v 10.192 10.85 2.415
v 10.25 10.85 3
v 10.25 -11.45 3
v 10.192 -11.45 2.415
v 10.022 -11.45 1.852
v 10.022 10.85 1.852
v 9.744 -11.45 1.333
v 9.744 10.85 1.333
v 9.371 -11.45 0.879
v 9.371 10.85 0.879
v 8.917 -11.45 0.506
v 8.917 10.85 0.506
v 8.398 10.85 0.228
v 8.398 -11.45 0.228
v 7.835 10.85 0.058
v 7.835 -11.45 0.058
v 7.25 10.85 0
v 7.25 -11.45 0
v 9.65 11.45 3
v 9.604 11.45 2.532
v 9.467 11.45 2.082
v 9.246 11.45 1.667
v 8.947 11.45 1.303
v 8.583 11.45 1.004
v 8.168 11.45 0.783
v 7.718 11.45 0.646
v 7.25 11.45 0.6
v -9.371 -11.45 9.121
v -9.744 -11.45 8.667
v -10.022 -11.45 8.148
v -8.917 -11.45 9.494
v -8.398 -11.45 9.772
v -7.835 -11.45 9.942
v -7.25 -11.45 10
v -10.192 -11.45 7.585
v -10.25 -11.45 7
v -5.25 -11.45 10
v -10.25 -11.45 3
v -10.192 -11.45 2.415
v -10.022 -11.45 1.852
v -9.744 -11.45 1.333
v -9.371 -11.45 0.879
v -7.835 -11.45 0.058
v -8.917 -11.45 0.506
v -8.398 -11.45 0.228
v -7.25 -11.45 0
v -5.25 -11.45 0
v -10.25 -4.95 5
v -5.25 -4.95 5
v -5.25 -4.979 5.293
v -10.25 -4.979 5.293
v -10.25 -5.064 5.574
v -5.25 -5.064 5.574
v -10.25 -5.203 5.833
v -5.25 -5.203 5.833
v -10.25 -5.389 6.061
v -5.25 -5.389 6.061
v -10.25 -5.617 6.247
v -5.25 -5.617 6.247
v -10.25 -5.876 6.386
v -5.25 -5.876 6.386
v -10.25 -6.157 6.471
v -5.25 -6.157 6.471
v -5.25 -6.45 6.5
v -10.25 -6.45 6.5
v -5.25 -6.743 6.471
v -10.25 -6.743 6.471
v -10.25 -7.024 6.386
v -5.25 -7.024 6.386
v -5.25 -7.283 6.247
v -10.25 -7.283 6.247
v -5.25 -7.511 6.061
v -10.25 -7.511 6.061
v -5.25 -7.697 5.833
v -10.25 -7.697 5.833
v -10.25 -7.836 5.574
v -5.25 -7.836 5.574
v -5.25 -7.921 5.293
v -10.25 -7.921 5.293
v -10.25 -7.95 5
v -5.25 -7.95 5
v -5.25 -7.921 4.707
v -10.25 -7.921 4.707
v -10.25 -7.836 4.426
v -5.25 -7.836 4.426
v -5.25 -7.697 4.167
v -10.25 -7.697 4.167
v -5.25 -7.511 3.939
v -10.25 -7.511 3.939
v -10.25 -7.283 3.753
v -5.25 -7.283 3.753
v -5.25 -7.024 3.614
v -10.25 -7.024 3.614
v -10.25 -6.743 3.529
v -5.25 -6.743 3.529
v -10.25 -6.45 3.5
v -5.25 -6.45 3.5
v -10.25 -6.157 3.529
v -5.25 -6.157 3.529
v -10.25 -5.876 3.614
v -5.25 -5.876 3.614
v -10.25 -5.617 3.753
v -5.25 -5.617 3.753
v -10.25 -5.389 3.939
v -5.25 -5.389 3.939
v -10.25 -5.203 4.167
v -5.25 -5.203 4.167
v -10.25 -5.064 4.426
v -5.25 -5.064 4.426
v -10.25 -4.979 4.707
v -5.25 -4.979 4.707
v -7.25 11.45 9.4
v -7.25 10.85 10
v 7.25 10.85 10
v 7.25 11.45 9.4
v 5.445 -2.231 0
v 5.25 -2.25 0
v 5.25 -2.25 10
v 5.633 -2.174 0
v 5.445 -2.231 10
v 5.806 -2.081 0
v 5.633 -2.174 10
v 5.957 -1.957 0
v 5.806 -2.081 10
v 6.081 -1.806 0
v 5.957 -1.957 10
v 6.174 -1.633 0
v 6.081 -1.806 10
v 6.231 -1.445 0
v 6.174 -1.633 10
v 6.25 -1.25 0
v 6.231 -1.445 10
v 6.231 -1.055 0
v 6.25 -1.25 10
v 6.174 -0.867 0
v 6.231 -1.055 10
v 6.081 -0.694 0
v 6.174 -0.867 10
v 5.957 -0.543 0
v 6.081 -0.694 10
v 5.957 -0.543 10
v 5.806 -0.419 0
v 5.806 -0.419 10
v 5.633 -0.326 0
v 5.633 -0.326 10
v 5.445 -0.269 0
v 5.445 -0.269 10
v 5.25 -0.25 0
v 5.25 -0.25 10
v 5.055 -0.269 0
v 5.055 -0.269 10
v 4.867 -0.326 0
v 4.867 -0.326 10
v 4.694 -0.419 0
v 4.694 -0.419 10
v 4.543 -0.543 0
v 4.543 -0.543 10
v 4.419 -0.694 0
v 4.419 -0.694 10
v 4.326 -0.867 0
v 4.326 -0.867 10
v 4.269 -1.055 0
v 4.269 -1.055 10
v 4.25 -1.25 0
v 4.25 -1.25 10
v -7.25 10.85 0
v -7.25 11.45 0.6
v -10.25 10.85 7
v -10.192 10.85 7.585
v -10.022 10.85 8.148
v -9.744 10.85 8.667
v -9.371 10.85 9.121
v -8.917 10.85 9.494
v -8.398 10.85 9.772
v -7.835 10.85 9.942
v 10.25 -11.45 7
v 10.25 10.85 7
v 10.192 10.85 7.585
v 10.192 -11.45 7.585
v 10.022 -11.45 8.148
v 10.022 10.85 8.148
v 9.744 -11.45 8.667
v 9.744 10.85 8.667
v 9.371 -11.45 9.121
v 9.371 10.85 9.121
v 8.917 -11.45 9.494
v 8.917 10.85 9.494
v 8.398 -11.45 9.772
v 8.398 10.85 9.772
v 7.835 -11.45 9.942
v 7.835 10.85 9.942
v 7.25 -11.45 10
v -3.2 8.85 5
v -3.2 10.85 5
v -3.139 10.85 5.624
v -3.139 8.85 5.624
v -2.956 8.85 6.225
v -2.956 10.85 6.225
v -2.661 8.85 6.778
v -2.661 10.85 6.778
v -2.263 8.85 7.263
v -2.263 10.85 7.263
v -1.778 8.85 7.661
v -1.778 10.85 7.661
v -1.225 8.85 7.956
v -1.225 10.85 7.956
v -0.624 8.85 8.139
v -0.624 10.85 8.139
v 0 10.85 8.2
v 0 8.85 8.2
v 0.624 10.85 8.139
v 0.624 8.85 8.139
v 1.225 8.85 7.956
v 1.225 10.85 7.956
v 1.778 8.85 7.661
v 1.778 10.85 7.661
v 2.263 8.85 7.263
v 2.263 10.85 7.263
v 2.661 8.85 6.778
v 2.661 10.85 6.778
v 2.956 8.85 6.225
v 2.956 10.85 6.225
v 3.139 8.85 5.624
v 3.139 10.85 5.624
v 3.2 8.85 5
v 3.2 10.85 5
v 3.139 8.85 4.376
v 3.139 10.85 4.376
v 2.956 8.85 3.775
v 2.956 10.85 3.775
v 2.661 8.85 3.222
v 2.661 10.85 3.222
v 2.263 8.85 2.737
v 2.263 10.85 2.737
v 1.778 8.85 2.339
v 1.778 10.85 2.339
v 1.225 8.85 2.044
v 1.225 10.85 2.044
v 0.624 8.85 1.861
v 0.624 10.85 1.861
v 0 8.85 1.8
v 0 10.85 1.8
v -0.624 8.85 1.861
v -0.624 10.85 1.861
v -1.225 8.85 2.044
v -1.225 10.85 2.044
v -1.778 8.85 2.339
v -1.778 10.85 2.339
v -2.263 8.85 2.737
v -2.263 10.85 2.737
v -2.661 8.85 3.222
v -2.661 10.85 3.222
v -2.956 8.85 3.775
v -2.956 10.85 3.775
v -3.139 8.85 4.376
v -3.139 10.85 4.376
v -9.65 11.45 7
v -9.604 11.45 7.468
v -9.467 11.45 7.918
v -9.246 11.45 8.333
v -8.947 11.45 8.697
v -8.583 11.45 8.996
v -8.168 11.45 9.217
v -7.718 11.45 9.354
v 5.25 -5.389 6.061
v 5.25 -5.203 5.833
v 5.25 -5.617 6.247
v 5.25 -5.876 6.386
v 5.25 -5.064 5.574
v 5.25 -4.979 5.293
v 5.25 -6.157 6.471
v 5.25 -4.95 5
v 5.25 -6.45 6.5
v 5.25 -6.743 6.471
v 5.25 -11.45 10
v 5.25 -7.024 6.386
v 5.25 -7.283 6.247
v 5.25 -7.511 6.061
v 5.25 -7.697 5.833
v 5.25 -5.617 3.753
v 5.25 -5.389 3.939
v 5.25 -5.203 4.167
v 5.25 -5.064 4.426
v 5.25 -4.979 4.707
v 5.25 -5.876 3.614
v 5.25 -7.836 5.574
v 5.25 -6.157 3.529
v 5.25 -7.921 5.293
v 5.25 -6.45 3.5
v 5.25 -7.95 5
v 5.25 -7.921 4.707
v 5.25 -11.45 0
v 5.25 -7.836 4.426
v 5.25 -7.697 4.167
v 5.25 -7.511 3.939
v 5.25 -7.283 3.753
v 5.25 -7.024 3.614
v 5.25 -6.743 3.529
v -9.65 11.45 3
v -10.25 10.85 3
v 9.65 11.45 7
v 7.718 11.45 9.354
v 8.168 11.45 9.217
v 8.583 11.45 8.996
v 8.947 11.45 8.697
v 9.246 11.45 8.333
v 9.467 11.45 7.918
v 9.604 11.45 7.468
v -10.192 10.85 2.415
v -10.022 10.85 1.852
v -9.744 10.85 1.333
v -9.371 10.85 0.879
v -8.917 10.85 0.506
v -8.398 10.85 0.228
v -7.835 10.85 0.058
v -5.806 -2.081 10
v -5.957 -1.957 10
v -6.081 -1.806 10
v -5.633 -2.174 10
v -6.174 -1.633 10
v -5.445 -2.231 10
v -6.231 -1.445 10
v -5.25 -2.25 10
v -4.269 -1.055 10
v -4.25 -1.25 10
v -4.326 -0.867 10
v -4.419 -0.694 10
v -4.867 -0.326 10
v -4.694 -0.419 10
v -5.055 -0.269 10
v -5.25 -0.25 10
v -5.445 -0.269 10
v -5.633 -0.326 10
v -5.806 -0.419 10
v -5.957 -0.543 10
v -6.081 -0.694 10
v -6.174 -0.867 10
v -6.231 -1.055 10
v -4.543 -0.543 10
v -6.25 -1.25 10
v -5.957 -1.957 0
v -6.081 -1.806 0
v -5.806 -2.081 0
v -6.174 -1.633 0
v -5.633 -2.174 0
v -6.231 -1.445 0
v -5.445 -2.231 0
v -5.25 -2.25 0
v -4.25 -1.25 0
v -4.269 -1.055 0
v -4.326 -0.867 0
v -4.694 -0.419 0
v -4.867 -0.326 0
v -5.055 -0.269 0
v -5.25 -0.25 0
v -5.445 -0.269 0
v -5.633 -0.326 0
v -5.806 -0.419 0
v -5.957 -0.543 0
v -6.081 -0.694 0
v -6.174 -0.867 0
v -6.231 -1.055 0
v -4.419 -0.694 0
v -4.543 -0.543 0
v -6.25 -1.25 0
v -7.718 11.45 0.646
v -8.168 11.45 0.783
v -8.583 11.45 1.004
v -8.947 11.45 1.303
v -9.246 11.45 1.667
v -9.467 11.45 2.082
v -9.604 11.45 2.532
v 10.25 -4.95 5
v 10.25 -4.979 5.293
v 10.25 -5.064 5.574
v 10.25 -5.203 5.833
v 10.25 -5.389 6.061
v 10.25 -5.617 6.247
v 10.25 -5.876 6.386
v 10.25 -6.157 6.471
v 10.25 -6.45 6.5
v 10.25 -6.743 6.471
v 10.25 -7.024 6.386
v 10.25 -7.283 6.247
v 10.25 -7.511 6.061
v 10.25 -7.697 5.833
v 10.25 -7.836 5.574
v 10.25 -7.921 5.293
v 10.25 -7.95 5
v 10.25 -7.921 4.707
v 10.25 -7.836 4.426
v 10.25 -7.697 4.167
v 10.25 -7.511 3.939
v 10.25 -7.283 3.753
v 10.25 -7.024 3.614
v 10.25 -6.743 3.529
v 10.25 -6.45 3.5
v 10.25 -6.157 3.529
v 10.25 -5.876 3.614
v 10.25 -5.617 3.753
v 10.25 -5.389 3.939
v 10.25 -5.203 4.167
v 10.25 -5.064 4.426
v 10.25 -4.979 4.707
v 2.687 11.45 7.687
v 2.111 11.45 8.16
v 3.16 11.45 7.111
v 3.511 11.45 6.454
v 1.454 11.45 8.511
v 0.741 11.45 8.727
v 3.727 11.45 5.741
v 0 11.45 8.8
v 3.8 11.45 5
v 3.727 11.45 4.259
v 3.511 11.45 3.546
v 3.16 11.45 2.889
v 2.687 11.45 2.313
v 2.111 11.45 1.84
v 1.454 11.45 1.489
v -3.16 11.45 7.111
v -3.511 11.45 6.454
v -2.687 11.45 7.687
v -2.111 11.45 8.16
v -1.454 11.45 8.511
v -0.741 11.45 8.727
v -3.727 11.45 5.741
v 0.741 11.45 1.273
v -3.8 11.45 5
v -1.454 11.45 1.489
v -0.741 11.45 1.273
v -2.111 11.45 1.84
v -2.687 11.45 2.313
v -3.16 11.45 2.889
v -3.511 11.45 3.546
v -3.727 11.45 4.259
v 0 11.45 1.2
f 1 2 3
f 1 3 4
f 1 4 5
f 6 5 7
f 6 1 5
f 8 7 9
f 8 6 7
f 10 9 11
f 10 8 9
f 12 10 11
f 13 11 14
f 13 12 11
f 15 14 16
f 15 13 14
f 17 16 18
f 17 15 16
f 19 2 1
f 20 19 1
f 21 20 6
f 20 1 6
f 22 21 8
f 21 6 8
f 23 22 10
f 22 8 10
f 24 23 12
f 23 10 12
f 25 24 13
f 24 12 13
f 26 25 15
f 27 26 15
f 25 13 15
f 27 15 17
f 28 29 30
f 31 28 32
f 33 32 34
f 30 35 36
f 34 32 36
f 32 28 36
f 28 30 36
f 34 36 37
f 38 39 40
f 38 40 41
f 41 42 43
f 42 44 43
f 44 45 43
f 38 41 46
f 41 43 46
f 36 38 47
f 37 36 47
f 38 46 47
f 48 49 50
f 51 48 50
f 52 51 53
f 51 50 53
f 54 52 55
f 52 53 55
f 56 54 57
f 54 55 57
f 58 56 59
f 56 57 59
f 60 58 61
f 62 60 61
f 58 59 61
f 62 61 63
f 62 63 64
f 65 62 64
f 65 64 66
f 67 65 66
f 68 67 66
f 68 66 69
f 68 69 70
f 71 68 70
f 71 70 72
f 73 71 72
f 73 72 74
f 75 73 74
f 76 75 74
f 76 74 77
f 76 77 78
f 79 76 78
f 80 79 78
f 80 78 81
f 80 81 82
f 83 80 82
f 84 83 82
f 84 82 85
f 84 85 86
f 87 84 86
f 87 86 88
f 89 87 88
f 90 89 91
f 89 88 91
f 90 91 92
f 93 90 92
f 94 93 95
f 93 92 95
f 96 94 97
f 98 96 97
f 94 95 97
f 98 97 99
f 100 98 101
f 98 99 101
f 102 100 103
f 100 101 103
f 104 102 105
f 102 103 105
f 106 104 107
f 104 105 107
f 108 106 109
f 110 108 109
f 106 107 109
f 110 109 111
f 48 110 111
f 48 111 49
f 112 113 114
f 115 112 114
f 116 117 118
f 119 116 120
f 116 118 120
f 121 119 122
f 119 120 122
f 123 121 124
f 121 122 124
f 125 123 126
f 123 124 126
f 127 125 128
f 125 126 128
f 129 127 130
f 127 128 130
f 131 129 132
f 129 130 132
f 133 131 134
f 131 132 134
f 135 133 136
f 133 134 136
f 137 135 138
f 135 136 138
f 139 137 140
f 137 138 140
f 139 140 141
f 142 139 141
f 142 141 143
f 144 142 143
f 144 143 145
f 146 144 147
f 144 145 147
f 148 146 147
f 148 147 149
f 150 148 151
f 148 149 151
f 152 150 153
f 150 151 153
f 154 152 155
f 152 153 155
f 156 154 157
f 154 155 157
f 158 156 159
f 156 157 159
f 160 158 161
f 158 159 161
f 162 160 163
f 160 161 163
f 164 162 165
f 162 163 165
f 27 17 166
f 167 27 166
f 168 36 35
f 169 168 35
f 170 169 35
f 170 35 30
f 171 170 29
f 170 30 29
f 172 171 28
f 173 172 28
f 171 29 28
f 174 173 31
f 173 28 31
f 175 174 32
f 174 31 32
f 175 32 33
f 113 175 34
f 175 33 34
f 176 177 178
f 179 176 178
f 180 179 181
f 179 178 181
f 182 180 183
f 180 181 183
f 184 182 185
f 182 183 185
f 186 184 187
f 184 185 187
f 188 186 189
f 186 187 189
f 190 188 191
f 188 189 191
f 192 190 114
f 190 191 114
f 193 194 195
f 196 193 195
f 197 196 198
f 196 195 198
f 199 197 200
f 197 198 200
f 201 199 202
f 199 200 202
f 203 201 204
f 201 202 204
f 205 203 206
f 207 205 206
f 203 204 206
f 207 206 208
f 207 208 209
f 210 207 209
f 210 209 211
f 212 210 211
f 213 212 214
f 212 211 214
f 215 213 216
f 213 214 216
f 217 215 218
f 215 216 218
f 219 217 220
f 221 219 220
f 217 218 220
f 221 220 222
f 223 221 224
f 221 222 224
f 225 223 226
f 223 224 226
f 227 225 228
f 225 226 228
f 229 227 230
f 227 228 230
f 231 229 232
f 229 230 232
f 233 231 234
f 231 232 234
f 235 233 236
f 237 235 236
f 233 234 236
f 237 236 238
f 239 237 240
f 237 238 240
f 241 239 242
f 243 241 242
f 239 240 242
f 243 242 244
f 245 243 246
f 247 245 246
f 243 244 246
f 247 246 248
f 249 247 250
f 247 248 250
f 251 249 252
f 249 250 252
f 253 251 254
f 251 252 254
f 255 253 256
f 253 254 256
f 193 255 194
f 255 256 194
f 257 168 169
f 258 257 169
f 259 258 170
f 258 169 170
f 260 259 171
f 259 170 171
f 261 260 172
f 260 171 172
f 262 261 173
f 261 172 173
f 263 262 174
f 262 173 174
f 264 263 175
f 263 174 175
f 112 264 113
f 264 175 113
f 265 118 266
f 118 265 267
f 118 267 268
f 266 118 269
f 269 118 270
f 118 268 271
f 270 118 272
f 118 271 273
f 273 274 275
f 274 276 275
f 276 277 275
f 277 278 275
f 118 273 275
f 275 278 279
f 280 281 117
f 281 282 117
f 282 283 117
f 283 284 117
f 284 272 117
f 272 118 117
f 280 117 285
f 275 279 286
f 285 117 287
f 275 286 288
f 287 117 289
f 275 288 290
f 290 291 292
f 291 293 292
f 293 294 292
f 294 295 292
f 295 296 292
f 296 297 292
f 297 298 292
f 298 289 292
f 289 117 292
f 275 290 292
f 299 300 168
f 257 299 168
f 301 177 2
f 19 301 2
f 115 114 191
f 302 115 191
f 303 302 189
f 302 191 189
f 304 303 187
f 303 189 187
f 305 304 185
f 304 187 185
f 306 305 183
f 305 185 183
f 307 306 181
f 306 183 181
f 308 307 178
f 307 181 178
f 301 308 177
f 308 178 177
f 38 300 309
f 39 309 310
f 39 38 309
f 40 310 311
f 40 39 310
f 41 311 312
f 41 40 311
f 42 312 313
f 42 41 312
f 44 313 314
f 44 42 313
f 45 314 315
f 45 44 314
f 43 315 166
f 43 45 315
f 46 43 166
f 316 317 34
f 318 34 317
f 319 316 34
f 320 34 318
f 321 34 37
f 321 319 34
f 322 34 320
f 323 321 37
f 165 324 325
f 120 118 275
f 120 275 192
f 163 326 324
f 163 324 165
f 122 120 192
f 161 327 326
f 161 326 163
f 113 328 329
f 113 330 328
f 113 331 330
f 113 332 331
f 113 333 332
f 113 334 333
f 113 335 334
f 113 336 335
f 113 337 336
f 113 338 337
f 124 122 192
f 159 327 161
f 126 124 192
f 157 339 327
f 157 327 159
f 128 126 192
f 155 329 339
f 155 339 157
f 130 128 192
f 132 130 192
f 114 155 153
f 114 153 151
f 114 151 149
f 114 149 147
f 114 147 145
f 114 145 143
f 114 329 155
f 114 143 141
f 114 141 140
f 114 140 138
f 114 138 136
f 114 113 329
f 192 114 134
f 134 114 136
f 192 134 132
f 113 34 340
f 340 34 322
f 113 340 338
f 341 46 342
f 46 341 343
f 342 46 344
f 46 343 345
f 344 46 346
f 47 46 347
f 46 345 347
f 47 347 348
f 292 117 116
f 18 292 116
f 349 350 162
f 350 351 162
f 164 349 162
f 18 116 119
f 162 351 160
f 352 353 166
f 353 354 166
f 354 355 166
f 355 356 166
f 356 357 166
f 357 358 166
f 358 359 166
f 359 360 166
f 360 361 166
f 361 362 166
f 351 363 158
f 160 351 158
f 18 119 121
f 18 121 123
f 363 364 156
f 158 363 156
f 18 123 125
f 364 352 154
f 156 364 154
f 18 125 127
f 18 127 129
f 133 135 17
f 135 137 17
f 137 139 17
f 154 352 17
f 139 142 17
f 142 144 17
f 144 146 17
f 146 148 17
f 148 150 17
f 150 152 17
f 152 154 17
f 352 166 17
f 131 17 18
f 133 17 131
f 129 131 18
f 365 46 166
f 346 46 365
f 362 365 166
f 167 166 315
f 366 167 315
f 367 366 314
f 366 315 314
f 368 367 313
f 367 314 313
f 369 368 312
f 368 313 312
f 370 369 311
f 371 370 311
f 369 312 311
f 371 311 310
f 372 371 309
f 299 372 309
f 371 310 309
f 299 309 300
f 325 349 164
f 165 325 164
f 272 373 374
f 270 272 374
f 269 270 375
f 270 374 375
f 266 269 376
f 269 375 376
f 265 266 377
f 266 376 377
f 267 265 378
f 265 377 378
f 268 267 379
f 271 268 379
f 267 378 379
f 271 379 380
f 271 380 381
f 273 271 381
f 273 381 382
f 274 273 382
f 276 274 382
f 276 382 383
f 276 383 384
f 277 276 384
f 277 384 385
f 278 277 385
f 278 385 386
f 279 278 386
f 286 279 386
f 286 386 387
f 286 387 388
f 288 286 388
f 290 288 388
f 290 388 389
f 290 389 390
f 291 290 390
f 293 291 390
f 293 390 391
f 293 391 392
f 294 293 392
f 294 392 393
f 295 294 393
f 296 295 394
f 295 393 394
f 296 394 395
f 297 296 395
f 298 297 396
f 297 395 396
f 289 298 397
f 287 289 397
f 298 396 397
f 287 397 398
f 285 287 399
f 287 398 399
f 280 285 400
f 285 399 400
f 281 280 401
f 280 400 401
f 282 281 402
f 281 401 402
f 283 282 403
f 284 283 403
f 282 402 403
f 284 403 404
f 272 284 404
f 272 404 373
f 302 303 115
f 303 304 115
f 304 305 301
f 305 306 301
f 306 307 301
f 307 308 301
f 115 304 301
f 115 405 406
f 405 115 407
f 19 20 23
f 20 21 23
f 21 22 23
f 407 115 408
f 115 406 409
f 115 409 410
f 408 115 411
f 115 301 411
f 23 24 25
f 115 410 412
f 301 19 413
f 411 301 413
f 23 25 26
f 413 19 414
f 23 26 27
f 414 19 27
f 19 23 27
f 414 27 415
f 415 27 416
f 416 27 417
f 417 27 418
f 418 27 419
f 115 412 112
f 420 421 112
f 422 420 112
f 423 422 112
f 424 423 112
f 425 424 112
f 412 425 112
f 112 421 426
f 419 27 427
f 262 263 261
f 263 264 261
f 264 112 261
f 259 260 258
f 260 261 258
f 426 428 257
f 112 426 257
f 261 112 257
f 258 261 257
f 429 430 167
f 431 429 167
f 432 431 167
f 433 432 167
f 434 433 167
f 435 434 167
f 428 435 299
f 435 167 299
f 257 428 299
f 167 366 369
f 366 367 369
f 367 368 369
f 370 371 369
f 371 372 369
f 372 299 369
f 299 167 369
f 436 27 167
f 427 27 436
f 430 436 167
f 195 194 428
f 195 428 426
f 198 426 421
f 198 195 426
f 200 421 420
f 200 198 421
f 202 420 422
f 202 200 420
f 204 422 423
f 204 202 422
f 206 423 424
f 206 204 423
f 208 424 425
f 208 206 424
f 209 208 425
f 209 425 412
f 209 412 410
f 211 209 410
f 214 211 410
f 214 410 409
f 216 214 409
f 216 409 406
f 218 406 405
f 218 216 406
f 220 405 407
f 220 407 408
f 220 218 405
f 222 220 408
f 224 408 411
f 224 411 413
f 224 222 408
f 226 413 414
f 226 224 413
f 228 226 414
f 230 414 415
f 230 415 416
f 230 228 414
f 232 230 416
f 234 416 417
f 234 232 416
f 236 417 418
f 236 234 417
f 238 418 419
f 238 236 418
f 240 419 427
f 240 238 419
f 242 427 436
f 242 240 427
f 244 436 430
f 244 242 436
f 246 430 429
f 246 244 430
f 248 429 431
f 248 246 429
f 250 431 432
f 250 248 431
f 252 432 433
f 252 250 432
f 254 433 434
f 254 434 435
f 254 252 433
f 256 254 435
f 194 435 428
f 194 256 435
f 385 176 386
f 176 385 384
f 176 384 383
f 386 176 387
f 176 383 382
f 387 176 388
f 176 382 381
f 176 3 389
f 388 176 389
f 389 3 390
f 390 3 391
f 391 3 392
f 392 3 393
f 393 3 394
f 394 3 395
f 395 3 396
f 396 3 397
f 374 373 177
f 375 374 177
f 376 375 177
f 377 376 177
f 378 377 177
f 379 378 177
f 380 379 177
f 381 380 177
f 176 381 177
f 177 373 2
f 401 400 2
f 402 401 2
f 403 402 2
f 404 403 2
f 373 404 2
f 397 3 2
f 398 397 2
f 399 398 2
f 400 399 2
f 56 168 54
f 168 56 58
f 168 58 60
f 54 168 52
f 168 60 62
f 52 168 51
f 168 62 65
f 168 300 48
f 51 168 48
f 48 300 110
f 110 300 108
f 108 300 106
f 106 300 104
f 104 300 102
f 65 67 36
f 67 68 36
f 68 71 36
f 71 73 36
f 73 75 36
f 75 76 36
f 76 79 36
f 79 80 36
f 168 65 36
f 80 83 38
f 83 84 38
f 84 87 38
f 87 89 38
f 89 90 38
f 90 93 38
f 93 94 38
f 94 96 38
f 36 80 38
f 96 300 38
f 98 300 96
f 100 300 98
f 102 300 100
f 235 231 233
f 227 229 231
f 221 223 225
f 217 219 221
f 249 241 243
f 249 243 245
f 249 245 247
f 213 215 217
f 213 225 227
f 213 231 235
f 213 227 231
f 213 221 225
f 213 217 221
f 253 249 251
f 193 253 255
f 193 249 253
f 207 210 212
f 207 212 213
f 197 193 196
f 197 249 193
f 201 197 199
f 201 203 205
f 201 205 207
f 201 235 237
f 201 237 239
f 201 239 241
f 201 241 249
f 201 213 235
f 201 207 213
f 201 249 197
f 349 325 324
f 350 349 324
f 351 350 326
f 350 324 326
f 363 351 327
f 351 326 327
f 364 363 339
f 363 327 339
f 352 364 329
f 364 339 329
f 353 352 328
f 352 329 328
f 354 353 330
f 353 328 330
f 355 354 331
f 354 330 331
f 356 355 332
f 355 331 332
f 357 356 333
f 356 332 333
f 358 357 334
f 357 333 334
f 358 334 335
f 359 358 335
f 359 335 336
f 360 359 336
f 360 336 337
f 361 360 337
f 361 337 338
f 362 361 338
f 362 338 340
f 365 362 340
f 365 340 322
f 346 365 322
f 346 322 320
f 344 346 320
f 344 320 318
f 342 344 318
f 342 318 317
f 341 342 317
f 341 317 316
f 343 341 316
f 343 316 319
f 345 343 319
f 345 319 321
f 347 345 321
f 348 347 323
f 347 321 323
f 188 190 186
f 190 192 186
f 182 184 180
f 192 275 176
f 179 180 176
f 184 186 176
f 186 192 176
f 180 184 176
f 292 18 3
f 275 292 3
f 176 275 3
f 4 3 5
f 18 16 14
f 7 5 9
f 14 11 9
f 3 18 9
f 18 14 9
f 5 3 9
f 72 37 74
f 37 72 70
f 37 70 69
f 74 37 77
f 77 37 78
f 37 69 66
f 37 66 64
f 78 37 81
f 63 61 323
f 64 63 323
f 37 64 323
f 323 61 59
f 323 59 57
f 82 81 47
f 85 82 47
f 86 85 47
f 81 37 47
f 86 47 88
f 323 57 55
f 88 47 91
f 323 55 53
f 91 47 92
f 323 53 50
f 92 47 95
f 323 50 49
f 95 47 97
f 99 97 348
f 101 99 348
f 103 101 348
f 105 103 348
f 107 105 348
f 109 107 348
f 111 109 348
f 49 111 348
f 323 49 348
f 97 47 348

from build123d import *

# Parameters (mm, degrees)
EXTRUDE_1_DEPTH     = 10
SKETCH_2_R          = 3.2
CUT_EXTRUDE_1_DEPTH = 2.6
SKETCH_3_R          = 1.5
CUT_EXTRUDE_2_DEPTH = 26.521608492
SKETCH_4_R          = 1
CUT_EXTRUDE_3_DEPTH = 19.334802971
FILLET_1_R          = 3
CHAMFER_1_SIZE      = 0.6


with BuildPart() as part:
    # ｽｹｯﾁ1 → ﾎﾞｽ - 押し出し1 (new body)
    with BuildSketch(Plane.XY):
        Polygon((-10.25, 11.45), (-10.25, -11.45), (-5.25, -11.45), (-5.25, -1.25), (5.25, -1.25), (5.25, -11.45), (10.25, -11.45), (10.25, 11.45), align=None)
    extrude(amount=EXTRUDE_1_DEPTH)

    # ｽｹｯﾁ2 → ｶｯﾄ - 押し出し1 (cut)
    with BuildSketch(Plane(origin=(0, 11.45, 0), x_dir=(1, 0, 0), z_dir=(0, 1, 0))):
        with Locations(Location((0, -5, 0), (0, 0, 180))):
            Circle(SKETCH_2_R)
    extrude(amount=-CUT_EXTRUDE_1_DEPTH, mode=Mode.SUBTRACT)

    # ｽｹｯﾁ3 → ｶｯﾄ - 押し出し2 (cut, through all)
    with BuildSketch(Plane(origin=(10.25, 0, 0), x_dir=(0, 0, -1), z_dir=(1, 0, 0))):
        with Locations(Location((-5, -6.45, 0), (0, 0, 90))):
            Circle(SKETCH_3_R)
    extrude(amount=-CUT_EXTRUDE_2_DEPTH, mode=Mode.SUBTRACT)

    # ｽｹｯﾁ4 → ｶｯﾄ - 押し出し3 (cut, through all)
    with BuildSketch(Plane.XY.offset(10)):
        with Locations((5.25, -1.25)):
            Circle(SKETCH_4_R)
        with Locations((-5.25, -1.25)):
            Circle(SKETCH_4_R)
    extrude(amount=-CUT_EXTRUDE_3_DEPTH, mode=Mode.SUBTRACT)

    # ﾌｨﾚｯﾄ1
    fillet_1_edges = [part.edges().sort_by_distance(p)[0] for p in [
        (-10.25, 0, 0),
        (10.25, 0, 0),
        (10.25, 0, 10),
        (-10.25, 0, 10),
    ]]
    fillet(fillet_1_edges, radius=FILLET_1_R)

    # 面取り1
    chamfer_1_edges = [part.edges().sort_by_distance(p)[0] for p in [
        (3.2, 11.45, 5),
        (0, 11.45, 0),
        (-10.25, 11.45, 5),
        (0, 11.45, 10),
        (10.25, 11.45, 5),
        (9.371320344, 11.45, 9.121320344),
        (9.371320344, 11.45, 0.878679656),
        (-9.371320344, 11.45, 9.121320344),
        (-9.371320344, 11.45, 0.878679656),
    ]]
    chamfer(chamfer_1_edges, length=CHAMFER_1_SIZE)


solid = part.part
